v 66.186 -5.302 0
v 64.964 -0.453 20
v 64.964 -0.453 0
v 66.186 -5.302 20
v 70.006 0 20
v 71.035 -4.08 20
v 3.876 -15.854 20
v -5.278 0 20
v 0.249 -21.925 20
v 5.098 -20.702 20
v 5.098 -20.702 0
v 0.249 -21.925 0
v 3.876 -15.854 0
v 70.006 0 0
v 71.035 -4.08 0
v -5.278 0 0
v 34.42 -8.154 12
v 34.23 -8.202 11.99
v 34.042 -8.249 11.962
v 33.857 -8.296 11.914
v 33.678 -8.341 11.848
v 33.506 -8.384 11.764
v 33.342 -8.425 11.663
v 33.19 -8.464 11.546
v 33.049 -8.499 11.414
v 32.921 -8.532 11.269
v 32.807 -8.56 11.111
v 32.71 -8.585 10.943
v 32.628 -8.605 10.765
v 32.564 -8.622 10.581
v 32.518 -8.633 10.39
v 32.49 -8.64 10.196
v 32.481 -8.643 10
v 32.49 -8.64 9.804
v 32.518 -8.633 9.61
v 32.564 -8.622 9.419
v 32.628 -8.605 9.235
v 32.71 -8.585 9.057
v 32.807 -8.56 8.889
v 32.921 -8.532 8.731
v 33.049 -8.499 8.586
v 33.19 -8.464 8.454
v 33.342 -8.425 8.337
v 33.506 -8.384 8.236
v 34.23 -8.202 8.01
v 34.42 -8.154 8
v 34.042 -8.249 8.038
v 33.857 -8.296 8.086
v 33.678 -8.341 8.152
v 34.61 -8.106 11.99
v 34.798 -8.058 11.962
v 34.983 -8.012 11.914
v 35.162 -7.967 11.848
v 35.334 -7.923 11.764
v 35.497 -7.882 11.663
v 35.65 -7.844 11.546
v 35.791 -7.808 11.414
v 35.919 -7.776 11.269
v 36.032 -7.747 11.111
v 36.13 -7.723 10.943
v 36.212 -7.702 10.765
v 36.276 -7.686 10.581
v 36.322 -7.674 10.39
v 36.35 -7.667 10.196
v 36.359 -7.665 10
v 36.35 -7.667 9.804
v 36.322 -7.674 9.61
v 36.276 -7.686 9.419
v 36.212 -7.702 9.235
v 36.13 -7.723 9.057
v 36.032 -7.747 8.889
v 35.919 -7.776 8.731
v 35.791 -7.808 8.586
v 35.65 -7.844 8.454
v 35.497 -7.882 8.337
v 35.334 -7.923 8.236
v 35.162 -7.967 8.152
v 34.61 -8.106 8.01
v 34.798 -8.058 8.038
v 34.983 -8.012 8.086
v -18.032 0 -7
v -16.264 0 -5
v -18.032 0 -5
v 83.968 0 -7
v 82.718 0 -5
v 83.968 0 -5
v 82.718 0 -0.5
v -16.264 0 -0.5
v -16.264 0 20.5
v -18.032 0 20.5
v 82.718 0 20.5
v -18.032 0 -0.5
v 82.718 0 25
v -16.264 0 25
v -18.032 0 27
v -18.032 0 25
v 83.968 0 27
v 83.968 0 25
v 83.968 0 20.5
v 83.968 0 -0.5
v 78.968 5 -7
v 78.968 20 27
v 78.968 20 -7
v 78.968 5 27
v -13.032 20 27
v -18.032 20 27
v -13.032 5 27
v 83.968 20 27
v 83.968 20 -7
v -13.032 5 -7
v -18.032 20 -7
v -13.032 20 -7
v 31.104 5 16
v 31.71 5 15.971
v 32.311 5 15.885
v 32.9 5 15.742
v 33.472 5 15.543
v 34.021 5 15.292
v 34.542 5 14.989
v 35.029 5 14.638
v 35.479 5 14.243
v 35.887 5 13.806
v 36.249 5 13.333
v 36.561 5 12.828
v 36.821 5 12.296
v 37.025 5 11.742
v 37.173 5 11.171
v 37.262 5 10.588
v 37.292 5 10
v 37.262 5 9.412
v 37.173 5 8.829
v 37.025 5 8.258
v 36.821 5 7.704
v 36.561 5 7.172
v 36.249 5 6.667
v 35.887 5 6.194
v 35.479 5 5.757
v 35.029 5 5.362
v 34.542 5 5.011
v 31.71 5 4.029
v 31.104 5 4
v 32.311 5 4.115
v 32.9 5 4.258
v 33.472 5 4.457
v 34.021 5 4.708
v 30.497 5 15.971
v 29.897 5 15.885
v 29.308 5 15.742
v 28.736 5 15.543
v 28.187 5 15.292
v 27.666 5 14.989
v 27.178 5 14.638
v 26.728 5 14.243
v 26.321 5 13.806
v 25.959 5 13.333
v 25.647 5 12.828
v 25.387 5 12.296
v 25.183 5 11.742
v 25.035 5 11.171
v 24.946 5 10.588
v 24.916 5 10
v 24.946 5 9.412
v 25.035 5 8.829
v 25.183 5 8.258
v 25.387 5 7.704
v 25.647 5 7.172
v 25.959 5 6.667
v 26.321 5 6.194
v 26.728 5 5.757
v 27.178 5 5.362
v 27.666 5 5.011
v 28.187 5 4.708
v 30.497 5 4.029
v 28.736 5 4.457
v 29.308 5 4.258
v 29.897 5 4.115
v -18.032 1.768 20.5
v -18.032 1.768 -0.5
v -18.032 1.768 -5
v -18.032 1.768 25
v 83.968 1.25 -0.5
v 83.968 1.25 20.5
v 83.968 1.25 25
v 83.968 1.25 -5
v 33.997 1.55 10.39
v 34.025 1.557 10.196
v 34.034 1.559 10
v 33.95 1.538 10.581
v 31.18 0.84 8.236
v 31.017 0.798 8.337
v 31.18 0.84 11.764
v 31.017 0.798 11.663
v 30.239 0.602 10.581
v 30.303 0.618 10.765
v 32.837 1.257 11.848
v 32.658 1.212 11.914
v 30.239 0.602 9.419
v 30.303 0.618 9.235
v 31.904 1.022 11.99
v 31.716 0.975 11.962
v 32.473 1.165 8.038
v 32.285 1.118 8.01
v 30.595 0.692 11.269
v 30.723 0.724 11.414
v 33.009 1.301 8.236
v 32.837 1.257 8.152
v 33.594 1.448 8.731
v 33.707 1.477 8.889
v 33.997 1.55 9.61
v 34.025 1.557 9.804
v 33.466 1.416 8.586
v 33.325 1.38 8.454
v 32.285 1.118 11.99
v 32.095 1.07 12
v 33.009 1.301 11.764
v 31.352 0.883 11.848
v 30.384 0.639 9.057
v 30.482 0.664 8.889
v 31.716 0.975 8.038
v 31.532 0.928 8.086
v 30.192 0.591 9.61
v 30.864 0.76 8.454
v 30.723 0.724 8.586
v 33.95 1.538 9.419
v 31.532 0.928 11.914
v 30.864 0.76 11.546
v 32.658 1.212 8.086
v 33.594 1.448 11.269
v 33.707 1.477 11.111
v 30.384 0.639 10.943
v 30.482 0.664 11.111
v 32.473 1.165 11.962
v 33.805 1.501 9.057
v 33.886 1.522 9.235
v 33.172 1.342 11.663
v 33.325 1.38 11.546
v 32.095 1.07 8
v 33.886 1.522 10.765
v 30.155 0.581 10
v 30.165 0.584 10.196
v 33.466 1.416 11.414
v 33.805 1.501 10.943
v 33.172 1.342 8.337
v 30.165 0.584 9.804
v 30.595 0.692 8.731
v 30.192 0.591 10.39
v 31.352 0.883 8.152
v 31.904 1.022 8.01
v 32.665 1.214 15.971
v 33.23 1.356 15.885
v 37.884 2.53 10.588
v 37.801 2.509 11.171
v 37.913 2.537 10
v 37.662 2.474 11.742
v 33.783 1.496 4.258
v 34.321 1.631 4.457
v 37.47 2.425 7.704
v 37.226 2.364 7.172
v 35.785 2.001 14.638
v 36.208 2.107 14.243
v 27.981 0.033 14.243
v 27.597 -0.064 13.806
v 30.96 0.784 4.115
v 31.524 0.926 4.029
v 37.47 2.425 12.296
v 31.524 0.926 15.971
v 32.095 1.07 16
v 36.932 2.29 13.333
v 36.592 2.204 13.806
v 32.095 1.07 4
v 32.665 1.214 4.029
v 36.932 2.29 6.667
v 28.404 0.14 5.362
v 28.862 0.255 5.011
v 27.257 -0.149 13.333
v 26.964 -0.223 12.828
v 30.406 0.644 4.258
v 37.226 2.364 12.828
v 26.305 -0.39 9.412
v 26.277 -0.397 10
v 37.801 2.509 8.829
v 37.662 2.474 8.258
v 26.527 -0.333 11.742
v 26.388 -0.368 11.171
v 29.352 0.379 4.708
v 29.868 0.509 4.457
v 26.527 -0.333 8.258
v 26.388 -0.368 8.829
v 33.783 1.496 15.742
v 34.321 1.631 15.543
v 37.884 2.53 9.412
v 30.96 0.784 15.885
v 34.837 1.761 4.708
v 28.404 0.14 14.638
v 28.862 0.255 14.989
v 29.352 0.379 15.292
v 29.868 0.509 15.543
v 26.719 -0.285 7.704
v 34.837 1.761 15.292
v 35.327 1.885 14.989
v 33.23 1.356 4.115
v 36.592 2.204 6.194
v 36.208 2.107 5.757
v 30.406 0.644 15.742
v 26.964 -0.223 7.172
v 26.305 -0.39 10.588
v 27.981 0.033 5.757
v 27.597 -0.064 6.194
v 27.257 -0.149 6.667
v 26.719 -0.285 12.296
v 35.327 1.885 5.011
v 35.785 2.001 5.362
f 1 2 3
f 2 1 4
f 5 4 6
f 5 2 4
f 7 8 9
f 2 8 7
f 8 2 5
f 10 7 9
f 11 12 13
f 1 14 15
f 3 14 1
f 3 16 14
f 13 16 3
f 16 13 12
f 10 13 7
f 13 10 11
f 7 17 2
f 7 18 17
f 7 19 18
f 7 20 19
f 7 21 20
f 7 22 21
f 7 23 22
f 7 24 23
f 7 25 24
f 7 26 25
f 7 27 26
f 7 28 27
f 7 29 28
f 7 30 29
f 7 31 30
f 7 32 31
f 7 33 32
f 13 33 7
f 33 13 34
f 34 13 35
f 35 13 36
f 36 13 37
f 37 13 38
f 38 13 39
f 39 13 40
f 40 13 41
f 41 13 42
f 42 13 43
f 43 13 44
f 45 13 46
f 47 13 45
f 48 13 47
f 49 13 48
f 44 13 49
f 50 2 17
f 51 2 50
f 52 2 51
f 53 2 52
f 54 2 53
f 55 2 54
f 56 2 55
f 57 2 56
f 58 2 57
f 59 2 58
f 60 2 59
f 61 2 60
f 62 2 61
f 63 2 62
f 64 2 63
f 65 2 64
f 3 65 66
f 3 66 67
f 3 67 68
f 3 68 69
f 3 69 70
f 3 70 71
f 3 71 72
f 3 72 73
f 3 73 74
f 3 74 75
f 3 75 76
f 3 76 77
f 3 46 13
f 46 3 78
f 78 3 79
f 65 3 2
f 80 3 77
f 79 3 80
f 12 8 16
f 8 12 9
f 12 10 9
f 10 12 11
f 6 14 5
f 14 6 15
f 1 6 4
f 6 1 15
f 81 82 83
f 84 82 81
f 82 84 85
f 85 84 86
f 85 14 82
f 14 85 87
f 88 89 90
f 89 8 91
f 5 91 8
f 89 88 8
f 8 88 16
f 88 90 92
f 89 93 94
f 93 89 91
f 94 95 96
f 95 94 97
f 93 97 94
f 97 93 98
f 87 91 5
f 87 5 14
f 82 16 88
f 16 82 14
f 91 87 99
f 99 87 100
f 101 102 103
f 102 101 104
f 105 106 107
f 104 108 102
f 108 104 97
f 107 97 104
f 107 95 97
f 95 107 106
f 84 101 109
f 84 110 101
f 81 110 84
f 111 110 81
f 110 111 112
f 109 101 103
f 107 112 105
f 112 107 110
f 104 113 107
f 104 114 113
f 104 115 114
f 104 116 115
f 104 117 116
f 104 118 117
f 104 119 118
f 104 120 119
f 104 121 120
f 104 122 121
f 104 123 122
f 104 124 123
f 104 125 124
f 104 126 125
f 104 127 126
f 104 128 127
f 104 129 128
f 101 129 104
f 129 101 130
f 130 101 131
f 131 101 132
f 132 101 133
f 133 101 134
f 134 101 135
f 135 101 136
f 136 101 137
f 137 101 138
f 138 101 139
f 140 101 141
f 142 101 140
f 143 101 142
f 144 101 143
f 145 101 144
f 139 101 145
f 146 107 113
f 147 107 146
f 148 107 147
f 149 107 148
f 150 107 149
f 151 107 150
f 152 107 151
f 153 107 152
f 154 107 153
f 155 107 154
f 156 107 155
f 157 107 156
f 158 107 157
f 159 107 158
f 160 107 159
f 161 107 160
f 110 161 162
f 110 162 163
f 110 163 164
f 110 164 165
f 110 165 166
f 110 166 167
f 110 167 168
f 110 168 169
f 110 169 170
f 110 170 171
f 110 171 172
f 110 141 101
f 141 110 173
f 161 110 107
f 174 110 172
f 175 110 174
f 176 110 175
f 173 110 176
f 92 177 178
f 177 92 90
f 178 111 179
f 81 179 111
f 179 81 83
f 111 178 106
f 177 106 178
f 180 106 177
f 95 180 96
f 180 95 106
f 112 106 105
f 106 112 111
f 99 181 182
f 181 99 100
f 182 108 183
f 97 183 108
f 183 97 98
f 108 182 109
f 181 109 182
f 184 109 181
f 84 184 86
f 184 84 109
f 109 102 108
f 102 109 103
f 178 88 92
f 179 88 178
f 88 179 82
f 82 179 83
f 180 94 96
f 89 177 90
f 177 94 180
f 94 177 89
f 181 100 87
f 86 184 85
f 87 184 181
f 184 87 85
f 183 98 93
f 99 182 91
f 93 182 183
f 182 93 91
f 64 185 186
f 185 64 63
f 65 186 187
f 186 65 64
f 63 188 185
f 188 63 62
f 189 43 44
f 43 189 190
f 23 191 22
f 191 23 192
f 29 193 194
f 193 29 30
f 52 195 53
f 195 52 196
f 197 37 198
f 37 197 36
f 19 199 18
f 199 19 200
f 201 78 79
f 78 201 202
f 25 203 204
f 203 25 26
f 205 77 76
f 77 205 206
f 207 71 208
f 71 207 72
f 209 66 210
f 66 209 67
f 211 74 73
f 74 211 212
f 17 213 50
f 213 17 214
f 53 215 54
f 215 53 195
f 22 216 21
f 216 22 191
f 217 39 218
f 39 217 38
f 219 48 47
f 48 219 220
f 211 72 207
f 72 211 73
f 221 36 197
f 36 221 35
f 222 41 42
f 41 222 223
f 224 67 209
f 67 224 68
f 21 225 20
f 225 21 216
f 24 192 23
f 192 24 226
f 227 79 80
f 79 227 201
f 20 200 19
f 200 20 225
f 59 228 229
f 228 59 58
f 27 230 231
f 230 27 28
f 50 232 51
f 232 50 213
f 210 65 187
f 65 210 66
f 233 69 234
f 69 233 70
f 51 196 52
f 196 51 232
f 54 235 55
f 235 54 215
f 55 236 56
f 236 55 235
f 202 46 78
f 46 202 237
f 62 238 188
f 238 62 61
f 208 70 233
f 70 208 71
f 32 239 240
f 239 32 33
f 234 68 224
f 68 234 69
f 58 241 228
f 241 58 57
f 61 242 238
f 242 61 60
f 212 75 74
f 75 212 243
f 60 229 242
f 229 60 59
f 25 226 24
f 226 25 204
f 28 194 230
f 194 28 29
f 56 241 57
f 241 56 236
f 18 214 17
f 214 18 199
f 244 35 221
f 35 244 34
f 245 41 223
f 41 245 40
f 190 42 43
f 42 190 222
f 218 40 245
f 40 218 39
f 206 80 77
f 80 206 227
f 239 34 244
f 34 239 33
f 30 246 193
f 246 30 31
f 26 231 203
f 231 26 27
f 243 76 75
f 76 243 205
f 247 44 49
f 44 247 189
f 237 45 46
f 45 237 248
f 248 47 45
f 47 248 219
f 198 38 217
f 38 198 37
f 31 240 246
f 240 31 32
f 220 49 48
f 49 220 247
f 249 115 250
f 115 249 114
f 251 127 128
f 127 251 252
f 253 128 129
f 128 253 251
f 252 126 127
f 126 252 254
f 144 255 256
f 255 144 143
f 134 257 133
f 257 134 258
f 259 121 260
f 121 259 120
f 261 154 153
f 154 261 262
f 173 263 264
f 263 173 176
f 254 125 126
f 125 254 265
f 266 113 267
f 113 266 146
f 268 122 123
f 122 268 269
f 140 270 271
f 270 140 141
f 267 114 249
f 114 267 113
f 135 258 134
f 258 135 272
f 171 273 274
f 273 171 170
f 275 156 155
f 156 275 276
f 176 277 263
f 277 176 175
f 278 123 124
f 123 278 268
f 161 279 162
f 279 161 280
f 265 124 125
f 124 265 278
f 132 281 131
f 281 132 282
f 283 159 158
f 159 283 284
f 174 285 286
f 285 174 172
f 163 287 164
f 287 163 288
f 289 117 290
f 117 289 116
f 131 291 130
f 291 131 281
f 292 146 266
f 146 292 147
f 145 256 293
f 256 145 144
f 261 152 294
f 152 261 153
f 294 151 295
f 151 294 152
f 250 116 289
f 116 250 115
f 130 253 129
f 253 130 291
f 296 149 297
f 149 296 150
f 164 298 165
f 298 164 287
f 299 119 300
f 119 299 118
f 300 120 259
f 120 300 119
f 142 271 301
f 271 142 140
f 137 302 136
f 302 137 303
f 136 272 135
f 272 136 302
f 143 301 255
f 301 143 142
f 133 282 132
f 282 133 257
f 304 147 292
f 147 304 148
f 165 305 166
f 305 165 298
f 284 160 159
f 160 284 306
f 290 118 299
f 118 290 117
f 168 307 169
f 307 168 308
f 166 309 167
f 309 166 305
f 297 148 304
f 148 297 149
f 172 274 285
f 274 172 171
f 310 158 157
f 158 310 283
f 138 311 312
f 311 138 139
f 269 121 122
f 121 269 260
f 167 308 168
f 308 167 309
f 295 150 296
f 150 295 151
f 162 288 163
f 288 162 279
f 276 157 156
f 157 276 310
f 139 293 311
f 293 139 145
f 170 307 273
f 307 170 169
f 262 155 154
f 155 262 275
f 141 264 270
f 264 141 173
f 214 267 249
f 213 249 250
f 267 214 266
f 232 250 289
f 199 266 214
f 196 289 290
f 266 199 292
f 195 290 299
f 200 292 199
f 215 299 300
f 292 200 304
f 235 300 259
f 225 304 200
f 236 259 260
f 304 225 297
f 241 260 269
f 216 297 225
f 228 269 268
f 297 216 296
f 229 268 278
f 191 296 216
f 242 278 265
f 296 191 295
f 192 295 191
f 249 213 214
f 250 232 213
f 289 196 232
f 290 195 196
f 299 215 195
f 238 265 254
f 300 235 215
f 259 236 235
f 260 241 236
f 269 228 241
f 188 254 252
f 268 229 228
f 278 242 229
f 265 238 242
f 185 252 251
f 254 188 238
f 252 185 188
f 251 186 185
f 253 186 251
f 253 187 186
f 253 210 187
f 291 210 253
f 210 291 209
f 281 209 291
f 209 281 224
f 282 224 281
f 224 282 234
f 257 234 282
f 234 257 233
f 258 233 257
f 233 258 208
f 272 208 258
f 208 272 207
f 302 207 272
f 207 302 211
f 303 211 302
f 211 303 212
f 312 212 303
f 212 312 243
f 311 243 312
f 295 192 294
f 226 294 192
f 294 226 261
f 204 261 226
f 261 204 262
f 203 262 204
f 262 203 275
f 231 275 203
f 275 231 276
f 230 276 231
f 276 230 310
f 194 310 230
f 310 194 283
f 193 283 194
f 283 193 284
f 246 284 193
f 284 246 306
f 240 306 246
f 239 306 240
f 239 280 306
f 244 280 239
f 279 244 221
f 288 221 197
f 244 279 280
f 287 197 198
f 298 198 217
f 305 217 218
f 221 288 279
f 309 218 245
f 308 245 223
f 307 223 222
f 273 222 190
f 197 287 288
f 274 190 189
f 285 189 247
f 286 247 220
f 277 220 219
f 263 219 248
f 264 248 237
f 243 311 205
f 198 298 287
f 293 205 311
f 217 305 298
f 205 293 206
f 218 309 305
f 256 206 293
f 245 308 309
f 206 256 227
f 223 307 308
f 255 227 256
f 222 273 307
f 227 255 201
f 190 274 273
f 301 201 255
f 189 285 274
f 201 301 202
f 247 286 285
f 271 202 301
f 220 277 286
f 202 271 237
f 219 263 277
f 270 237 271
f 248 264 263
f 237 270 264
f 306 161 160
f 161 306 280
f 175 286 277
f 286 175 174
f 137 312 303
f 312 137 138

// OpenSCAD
WEDGE_ANGLE = atan(7.5/29.75);
BOARD_X = 63;
BOARD_Y = 19.05;
BANNISTER_X = 92; // error in here
DEFAULT_THICKNESS = 5;
BRACKET_Z = 34;
WEDGE_Z = 20;

ZIPTIE_Z = 4.5;
ZIPTIE_Y = 1.25;


module wedge() {
    // wedge
    S = sin(WEDGE_ANGLE) * BOARD_X;
    T = sqrt(pow(S, 2) + pow(BOARD_X, 2));
    Q = sin(WEDGE_ANGLE) * T;
    R = sin(WEDGE_ANGLE) * Q;
    difference() {
        union() {
            intersection() {
                translate([R, (-1 * Q), 0]) rotate([0, 0, WEDGE_ANGLE]) union() {
                    cube([BOARD_X, Q + 1, WEDGE_Z]);
                    translate([-1 * DEFAULT_THICKNESS, -1 * DEFAULT_THICKNESS, 0]) cube([DEFAULT_THICKNESS, Q + (2 * DEFAULT_THICKNESS), WEDGE_Z]);
                    translate([BOARD_X, -1 * DEFAULT_THICKNESS, 0]) cube([DEFAULT_THICKNESS, Q + DEFAULT_THICKNESS, WEDGE_Z]);
                }
                translate([-2 * R, -2 * S, 0]) cube([T + (4*DEFAULT_THICKNESS), 2 * S, WEDGE_Z]);
            }
            
            // bracket plate that mounts to wedge
            BRACKET_X = BANNISTER_X; // + (2 * DEFAULT_THICKNESS);
            WING_HYPOTENUSE = 1 / (cos(WEDGE_ANGLE) / DEFAULT_THICKNESS);
            
            WING_DEPTH = 4 * DEFAULT_THICKNESS;
            
            translate([-0.5 * (BRACKET_X - (cos(WEDGE_ANGLE) * (BOARD_X + DEFAULT_THICKNESS))), 0, -0.5 * (BRACKET_Z - WEDGE_Z)]) {
                difference() {
                    union() {
                        cube([BRACKET_X, DEFAULT_THICKNESS, BRACKET_Z]);
                        translate([-1 * DEFAULT_THICKNESS, 0, 0]) cube([DEFAULT_THICKNESS, WING_DEPTH, BRACKET_Z]);
                        translate([BRACKET_X, 0, 0]) cube([DEFAULT_THICKNESS, WING_DEPTH, BRACKET_Z]);
                    }

                    ZIPTIE_INSET_Z = (0.5 * (BRACKET_Z - WEDGE_Z)) - ZIPTIE_Z;
                    ///#translate([(-1 * DEFAULT_THICKNESS) - 10, 10, ZIPTIE_INSET_Z - 0.5]) rotate([0, 0, -45]) cube([BRACKET_X + (2 * DEFAULT_THICKNESS), ZIPTIE_Y, ZIPTIE_Z]);                    
                    //#translate([(-1 * DEFAULT_THICKNESS) - 10, 10, BRACKET_Z - (ZIPTIE_Z + ZIPTIE_INSET_Z) + 0.5]) rotate([0, 0, -45]) cube([BRACKET_X + (2 * DEFAULT_THICKNESS), ZIPTIE_Y, ZIPTIE_Z]);                    
                    
                    // main face original
                    //translate([-1 * DEFAULT_THICKNESS, 0, ZIPTIE_INSET_Z - 0.5]) cube([BRACKET_X + (2 * DEFAULT_THICKNESS), ZIPTIE_Y, ZIPTIE_Z]);
                    //translate([-1 * DEFAULT_THICKNESS, 0, BRACKET_Z - (ZIPTIE_Z + ZIPTIE_INSET_Z) + 0.5]) cube([BRACKET_X + (2 * DEFAULT_THICKNESS), ZIPTIE_Y, ZIPTIE_Z]);

                    
                    translate([(-1 * DEFAULT_THICKNESS) + 10, -10, ZIPTIE_INSET_Z - 0.5]) rotate([0, 0, 45]) cube([ZIPTIE_Y, WING_DEPTH, ZIPTIE_Z]);
                    translate([(-1 * DEFAULT_THICKNESS) + 10, -10, BRACKET_Z - (ZIPTIE_Z + ZIPTIE_INSET_Z) + 0.5]) rotate([0, 0, 45])  cube([ZIPTIE_Y, WING_DEPTH, ZIPTIE_Z]);
                   
                    #translate([(BRACKET_X + DEFAULT_THICKNESS) - ZIPTIE_Y - 10, -10, ZIPTIE_INSET_Z - 0.5]) rotate([0, 0, -45]) cube([ZIPTIE_Y, WING_DEPTH, ZIPTIE_Z]);
                    #translate([(BRACKET_X + DEFAULT_THICKNESS) - ZIPTIE_Y - 10, -10, BRACKET_Z - (ZIPTIE_Z + ZIPTIE_INSET_Z) + 0.5]) rotate([0, 0, -45]) cube([ZIPTIE_Y, WING_DEPTH, ZIPTIE_Z]);

                }
                
             }
         }
         translate([R, (-1 * Q), 0]) rotate([0, 0, WEDGE_ANGLE]) translate([0.5 * BOARD_X, 1.6 * Q, 0.5 * WEDGE_Z]) rotate([90, 0, 0]) union() {   
            cylinder(d=4, h=50, $fn=64);
            cylinder(d=12, h=Q, $fn=64);
         }
     }

    
    
}

wedge();
